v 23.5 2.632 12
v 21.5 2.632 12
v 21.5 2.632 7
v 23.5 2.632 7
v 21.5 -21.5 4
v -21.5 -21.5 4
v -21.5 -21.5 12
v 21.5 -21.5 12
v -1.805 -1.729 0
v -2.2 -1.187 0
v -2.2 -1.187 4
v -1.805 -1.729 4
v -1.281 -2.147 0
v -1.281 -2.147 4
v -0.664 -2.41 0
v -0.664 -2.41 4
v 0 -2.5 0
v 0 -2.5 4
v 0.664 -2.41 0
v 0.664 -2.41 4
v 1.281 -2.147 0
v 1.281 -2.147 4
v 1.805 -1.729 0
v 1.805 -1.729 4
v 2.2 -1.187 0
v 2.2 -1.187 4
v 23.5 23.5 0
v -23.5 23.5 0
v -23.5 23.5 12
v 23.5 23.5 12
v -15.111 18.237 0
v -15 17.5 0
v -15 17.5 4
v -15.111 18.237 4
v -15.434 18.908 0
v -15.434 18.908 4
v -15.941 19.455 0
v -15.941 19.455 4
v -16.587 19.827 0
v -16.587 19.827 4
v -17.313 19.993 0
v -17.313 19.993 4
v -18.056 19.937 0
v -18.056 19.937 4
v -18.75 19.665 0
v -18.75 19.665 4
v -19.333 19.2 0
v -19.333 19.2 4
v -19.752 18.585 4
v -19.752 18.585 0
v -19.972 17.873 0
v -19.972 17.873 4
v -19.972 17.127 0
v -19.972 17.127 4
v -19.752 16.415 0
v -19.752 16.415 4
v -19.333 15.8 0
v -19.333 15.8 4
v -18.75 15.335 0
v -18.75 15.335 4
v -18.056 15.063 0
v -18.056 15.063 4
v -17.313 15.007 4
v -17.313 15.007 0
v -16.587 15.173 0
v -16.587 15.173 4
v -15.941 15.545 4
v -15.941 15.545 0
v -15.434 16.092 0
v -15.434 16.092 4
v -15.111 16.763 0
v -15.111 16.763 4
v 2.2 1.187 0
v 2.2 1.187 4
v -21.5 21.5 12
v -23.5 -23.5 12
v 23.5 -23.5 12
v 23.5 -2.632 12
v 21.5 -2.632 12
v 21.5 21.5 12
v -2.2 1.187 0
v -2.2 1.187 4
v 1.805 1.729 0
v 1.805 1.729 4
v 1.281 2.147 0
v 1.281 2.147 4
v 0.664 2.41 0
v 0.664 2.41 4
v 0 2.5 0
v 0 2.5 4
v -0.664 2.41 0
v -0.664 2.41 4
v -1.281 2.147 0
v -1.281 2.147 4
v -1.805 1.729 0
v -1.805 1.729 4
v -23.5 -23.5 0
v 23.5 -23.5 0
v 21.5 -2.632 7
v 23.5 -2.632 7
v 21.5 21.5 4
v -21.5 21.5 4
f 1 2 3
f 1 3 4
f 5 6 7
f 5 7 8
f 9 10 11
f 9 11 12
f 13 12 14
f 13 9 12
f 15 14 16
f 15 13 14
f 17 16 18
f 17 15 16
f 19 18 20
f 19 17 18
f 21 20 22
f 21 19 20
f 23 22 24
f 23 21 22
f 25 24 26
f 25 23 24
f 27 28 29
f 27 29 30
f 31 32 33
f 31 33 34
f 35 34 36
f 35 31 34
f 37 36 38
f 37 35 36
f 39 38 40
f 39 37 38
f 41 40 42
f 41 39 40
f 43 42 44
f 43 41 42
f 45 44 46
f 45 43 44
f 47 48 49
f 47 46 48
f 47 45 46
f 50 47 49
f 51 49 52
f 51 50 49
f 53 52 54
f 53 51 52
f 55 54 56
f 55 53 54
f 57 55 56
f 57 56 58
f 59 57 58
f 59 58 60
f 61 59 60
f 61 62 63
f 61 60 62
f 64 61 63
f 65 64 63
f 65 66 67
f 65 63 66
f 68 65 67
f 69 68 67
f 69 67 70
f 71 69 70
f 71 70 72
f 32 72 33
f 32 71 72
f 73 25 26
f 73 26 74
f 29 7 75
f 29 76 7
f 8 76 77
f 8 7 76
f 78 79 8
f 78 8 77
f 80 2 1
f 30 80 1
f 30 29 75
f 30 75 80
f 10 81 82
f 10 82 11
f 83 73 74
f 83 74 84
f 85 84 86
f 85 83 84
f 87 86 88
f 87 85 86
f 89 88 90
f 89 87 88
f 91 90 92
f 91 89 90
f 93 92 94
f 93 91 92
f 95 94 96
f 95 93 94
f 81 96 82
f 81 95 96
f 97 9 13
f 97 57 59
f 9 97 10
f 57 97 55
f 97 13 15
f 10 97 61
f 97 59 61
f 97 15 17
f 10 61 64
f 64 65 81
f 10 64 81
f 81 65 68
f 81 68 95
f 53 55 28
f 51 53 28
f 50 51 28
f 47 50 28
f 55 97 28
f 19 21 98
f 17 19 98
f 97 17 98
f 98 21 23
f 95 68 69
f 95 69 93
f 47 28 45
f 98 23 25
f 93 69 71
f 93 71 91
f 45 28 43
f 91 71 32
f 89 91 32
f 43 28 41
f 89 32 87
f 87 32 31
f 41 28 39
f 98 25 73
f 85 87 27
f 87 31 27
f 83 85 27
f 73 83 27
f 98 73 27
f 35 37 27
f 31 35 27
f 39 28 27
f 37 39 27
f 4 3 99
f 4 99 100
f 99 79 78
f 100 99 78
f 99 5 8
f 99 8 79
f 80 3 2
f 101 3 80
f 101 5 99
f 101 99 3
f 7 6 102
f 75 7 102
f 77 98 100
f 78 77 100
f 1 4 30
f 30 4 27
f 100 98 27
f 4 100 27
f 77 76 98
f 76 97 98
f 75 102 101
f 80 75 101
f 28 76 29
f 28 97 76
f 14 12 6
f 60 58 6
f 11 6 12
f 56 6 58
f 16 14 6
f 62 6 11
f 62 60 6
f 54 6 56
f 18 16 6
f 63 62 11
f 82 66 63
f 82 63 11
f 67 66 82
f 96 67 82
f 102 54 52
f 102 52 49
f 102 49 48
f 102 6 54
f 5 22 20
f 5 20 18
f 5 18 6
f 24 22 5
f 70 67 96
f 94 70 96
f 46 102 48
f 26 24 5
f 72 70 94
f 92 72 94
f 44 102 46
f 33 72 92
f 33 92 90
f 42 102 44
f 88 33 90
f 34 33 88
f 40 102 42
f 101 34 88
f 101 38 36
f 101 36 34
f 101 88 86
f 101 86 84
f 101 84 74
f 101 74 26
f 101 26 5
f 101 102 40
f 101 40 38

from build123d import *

# Parameters (mm, degrees)
SKETCH1_W               = 47
SKETCH1_H               = 47
BOSS_EXTRUDE1_DEPTH     = 4
CUT_EXTRUDE1_DEPTH      = 34.473870407
CUT_EXTRUDE1_DEPTH_BACK = 34.473870407
CUT_EXTRUDE2_DEPTH      = 34.473870407
CUT_EXTRUDE2_DEPTH_BACK = 34.473870407
SKETCH3_R               = 2.5
SKETCH4_W               = 47
SKETCH4_H               = 47
SKETCH4_W_2             = 43
SKETCH4_H_2             = 43
BOSS_EXTRUDE2_DEPTH     = 8
SKETCH5_W               = 2
SKETCH5_H               = 5.263518928
CUT_EXTRUDE3_DEPTH      = 5


with BuildPart() as part:
    # Sketch1 → Boss-Extrude1 (new body)
    with BuildSketch(Plane.XY):
        Rectangle(SKETCH1_W, SKETCH1_H)
    extrude(amount=BOSS_EXTRUDE1_DEPTH)

    # Sketch2 → Cut-Extrude1 (cut, two sides: drawn at the far end of the back side and taken through both)
    with BuildSketch(Plane.XY.offset(4).offset(-CUT_EXTRUDE1_DEPTH_BACK)):
        with BuildLine():
            Line((-2.2, 1.187434209), (-2.2, -1.187434209))
            ThreePointArc((-2.2, -1.187434209), (0, -2.5), (2.2, -1.187434209))
            Line((2.2, -1.187434209), (2.2, 1.187434209))
            ThreePointArc((2.2, 1.187434209), (0, 2.5), (-2.2, 1.187434209))
        make_face()
    extrude(amount=CUT_EXTRUDE1_DEPTH + CUT_EXTRUDE1_DEPTH_BACK, mode=Mode.SUBTRACT)

    # Sketch3 → Cut-Extrude2 (cut, two sides: drawn at the far end of the back side and taken through both)
    with BuildSketch(Plane.XY.offset(4).offset(-CUT_EXTRUDE2_DEPTH_BACK)):
        with Locations((-17.5, 17.5)):
            Circle(SKETCH3_R)
    extrude(amount=CUT_EXTRUDE2_DEPTH + CUT_EXTRUDE2_DEPTH_BACK, mode=Mode.SUBTRACT)

    # Sketch4 → Boss-Extrude2 (add)
    with BuildSketch(Plane.XY.offset(4)):
        Rectangle(SKETCH4_W, SKETCH4_H)
        Rectangle(SKETCH4_W_2, SKETCH4_H_2, mode=Mode.SUBTRACT)
    extrude(amount=BOSS_EXTRUDE2_DEPTH)

    # Sketch5 → Cut-Extrude3 (cut)
    with BuildSketch(Plane.XY.offset(12)):
        with Locations((22.5, 0)):
            Rectangle(SKETCH5_W, SKETCH5_H)
    extrude(amount=-CUT_EXTRUDE3_DEPTH, mode=Mode.SUBTRACT)


solid = part.part
